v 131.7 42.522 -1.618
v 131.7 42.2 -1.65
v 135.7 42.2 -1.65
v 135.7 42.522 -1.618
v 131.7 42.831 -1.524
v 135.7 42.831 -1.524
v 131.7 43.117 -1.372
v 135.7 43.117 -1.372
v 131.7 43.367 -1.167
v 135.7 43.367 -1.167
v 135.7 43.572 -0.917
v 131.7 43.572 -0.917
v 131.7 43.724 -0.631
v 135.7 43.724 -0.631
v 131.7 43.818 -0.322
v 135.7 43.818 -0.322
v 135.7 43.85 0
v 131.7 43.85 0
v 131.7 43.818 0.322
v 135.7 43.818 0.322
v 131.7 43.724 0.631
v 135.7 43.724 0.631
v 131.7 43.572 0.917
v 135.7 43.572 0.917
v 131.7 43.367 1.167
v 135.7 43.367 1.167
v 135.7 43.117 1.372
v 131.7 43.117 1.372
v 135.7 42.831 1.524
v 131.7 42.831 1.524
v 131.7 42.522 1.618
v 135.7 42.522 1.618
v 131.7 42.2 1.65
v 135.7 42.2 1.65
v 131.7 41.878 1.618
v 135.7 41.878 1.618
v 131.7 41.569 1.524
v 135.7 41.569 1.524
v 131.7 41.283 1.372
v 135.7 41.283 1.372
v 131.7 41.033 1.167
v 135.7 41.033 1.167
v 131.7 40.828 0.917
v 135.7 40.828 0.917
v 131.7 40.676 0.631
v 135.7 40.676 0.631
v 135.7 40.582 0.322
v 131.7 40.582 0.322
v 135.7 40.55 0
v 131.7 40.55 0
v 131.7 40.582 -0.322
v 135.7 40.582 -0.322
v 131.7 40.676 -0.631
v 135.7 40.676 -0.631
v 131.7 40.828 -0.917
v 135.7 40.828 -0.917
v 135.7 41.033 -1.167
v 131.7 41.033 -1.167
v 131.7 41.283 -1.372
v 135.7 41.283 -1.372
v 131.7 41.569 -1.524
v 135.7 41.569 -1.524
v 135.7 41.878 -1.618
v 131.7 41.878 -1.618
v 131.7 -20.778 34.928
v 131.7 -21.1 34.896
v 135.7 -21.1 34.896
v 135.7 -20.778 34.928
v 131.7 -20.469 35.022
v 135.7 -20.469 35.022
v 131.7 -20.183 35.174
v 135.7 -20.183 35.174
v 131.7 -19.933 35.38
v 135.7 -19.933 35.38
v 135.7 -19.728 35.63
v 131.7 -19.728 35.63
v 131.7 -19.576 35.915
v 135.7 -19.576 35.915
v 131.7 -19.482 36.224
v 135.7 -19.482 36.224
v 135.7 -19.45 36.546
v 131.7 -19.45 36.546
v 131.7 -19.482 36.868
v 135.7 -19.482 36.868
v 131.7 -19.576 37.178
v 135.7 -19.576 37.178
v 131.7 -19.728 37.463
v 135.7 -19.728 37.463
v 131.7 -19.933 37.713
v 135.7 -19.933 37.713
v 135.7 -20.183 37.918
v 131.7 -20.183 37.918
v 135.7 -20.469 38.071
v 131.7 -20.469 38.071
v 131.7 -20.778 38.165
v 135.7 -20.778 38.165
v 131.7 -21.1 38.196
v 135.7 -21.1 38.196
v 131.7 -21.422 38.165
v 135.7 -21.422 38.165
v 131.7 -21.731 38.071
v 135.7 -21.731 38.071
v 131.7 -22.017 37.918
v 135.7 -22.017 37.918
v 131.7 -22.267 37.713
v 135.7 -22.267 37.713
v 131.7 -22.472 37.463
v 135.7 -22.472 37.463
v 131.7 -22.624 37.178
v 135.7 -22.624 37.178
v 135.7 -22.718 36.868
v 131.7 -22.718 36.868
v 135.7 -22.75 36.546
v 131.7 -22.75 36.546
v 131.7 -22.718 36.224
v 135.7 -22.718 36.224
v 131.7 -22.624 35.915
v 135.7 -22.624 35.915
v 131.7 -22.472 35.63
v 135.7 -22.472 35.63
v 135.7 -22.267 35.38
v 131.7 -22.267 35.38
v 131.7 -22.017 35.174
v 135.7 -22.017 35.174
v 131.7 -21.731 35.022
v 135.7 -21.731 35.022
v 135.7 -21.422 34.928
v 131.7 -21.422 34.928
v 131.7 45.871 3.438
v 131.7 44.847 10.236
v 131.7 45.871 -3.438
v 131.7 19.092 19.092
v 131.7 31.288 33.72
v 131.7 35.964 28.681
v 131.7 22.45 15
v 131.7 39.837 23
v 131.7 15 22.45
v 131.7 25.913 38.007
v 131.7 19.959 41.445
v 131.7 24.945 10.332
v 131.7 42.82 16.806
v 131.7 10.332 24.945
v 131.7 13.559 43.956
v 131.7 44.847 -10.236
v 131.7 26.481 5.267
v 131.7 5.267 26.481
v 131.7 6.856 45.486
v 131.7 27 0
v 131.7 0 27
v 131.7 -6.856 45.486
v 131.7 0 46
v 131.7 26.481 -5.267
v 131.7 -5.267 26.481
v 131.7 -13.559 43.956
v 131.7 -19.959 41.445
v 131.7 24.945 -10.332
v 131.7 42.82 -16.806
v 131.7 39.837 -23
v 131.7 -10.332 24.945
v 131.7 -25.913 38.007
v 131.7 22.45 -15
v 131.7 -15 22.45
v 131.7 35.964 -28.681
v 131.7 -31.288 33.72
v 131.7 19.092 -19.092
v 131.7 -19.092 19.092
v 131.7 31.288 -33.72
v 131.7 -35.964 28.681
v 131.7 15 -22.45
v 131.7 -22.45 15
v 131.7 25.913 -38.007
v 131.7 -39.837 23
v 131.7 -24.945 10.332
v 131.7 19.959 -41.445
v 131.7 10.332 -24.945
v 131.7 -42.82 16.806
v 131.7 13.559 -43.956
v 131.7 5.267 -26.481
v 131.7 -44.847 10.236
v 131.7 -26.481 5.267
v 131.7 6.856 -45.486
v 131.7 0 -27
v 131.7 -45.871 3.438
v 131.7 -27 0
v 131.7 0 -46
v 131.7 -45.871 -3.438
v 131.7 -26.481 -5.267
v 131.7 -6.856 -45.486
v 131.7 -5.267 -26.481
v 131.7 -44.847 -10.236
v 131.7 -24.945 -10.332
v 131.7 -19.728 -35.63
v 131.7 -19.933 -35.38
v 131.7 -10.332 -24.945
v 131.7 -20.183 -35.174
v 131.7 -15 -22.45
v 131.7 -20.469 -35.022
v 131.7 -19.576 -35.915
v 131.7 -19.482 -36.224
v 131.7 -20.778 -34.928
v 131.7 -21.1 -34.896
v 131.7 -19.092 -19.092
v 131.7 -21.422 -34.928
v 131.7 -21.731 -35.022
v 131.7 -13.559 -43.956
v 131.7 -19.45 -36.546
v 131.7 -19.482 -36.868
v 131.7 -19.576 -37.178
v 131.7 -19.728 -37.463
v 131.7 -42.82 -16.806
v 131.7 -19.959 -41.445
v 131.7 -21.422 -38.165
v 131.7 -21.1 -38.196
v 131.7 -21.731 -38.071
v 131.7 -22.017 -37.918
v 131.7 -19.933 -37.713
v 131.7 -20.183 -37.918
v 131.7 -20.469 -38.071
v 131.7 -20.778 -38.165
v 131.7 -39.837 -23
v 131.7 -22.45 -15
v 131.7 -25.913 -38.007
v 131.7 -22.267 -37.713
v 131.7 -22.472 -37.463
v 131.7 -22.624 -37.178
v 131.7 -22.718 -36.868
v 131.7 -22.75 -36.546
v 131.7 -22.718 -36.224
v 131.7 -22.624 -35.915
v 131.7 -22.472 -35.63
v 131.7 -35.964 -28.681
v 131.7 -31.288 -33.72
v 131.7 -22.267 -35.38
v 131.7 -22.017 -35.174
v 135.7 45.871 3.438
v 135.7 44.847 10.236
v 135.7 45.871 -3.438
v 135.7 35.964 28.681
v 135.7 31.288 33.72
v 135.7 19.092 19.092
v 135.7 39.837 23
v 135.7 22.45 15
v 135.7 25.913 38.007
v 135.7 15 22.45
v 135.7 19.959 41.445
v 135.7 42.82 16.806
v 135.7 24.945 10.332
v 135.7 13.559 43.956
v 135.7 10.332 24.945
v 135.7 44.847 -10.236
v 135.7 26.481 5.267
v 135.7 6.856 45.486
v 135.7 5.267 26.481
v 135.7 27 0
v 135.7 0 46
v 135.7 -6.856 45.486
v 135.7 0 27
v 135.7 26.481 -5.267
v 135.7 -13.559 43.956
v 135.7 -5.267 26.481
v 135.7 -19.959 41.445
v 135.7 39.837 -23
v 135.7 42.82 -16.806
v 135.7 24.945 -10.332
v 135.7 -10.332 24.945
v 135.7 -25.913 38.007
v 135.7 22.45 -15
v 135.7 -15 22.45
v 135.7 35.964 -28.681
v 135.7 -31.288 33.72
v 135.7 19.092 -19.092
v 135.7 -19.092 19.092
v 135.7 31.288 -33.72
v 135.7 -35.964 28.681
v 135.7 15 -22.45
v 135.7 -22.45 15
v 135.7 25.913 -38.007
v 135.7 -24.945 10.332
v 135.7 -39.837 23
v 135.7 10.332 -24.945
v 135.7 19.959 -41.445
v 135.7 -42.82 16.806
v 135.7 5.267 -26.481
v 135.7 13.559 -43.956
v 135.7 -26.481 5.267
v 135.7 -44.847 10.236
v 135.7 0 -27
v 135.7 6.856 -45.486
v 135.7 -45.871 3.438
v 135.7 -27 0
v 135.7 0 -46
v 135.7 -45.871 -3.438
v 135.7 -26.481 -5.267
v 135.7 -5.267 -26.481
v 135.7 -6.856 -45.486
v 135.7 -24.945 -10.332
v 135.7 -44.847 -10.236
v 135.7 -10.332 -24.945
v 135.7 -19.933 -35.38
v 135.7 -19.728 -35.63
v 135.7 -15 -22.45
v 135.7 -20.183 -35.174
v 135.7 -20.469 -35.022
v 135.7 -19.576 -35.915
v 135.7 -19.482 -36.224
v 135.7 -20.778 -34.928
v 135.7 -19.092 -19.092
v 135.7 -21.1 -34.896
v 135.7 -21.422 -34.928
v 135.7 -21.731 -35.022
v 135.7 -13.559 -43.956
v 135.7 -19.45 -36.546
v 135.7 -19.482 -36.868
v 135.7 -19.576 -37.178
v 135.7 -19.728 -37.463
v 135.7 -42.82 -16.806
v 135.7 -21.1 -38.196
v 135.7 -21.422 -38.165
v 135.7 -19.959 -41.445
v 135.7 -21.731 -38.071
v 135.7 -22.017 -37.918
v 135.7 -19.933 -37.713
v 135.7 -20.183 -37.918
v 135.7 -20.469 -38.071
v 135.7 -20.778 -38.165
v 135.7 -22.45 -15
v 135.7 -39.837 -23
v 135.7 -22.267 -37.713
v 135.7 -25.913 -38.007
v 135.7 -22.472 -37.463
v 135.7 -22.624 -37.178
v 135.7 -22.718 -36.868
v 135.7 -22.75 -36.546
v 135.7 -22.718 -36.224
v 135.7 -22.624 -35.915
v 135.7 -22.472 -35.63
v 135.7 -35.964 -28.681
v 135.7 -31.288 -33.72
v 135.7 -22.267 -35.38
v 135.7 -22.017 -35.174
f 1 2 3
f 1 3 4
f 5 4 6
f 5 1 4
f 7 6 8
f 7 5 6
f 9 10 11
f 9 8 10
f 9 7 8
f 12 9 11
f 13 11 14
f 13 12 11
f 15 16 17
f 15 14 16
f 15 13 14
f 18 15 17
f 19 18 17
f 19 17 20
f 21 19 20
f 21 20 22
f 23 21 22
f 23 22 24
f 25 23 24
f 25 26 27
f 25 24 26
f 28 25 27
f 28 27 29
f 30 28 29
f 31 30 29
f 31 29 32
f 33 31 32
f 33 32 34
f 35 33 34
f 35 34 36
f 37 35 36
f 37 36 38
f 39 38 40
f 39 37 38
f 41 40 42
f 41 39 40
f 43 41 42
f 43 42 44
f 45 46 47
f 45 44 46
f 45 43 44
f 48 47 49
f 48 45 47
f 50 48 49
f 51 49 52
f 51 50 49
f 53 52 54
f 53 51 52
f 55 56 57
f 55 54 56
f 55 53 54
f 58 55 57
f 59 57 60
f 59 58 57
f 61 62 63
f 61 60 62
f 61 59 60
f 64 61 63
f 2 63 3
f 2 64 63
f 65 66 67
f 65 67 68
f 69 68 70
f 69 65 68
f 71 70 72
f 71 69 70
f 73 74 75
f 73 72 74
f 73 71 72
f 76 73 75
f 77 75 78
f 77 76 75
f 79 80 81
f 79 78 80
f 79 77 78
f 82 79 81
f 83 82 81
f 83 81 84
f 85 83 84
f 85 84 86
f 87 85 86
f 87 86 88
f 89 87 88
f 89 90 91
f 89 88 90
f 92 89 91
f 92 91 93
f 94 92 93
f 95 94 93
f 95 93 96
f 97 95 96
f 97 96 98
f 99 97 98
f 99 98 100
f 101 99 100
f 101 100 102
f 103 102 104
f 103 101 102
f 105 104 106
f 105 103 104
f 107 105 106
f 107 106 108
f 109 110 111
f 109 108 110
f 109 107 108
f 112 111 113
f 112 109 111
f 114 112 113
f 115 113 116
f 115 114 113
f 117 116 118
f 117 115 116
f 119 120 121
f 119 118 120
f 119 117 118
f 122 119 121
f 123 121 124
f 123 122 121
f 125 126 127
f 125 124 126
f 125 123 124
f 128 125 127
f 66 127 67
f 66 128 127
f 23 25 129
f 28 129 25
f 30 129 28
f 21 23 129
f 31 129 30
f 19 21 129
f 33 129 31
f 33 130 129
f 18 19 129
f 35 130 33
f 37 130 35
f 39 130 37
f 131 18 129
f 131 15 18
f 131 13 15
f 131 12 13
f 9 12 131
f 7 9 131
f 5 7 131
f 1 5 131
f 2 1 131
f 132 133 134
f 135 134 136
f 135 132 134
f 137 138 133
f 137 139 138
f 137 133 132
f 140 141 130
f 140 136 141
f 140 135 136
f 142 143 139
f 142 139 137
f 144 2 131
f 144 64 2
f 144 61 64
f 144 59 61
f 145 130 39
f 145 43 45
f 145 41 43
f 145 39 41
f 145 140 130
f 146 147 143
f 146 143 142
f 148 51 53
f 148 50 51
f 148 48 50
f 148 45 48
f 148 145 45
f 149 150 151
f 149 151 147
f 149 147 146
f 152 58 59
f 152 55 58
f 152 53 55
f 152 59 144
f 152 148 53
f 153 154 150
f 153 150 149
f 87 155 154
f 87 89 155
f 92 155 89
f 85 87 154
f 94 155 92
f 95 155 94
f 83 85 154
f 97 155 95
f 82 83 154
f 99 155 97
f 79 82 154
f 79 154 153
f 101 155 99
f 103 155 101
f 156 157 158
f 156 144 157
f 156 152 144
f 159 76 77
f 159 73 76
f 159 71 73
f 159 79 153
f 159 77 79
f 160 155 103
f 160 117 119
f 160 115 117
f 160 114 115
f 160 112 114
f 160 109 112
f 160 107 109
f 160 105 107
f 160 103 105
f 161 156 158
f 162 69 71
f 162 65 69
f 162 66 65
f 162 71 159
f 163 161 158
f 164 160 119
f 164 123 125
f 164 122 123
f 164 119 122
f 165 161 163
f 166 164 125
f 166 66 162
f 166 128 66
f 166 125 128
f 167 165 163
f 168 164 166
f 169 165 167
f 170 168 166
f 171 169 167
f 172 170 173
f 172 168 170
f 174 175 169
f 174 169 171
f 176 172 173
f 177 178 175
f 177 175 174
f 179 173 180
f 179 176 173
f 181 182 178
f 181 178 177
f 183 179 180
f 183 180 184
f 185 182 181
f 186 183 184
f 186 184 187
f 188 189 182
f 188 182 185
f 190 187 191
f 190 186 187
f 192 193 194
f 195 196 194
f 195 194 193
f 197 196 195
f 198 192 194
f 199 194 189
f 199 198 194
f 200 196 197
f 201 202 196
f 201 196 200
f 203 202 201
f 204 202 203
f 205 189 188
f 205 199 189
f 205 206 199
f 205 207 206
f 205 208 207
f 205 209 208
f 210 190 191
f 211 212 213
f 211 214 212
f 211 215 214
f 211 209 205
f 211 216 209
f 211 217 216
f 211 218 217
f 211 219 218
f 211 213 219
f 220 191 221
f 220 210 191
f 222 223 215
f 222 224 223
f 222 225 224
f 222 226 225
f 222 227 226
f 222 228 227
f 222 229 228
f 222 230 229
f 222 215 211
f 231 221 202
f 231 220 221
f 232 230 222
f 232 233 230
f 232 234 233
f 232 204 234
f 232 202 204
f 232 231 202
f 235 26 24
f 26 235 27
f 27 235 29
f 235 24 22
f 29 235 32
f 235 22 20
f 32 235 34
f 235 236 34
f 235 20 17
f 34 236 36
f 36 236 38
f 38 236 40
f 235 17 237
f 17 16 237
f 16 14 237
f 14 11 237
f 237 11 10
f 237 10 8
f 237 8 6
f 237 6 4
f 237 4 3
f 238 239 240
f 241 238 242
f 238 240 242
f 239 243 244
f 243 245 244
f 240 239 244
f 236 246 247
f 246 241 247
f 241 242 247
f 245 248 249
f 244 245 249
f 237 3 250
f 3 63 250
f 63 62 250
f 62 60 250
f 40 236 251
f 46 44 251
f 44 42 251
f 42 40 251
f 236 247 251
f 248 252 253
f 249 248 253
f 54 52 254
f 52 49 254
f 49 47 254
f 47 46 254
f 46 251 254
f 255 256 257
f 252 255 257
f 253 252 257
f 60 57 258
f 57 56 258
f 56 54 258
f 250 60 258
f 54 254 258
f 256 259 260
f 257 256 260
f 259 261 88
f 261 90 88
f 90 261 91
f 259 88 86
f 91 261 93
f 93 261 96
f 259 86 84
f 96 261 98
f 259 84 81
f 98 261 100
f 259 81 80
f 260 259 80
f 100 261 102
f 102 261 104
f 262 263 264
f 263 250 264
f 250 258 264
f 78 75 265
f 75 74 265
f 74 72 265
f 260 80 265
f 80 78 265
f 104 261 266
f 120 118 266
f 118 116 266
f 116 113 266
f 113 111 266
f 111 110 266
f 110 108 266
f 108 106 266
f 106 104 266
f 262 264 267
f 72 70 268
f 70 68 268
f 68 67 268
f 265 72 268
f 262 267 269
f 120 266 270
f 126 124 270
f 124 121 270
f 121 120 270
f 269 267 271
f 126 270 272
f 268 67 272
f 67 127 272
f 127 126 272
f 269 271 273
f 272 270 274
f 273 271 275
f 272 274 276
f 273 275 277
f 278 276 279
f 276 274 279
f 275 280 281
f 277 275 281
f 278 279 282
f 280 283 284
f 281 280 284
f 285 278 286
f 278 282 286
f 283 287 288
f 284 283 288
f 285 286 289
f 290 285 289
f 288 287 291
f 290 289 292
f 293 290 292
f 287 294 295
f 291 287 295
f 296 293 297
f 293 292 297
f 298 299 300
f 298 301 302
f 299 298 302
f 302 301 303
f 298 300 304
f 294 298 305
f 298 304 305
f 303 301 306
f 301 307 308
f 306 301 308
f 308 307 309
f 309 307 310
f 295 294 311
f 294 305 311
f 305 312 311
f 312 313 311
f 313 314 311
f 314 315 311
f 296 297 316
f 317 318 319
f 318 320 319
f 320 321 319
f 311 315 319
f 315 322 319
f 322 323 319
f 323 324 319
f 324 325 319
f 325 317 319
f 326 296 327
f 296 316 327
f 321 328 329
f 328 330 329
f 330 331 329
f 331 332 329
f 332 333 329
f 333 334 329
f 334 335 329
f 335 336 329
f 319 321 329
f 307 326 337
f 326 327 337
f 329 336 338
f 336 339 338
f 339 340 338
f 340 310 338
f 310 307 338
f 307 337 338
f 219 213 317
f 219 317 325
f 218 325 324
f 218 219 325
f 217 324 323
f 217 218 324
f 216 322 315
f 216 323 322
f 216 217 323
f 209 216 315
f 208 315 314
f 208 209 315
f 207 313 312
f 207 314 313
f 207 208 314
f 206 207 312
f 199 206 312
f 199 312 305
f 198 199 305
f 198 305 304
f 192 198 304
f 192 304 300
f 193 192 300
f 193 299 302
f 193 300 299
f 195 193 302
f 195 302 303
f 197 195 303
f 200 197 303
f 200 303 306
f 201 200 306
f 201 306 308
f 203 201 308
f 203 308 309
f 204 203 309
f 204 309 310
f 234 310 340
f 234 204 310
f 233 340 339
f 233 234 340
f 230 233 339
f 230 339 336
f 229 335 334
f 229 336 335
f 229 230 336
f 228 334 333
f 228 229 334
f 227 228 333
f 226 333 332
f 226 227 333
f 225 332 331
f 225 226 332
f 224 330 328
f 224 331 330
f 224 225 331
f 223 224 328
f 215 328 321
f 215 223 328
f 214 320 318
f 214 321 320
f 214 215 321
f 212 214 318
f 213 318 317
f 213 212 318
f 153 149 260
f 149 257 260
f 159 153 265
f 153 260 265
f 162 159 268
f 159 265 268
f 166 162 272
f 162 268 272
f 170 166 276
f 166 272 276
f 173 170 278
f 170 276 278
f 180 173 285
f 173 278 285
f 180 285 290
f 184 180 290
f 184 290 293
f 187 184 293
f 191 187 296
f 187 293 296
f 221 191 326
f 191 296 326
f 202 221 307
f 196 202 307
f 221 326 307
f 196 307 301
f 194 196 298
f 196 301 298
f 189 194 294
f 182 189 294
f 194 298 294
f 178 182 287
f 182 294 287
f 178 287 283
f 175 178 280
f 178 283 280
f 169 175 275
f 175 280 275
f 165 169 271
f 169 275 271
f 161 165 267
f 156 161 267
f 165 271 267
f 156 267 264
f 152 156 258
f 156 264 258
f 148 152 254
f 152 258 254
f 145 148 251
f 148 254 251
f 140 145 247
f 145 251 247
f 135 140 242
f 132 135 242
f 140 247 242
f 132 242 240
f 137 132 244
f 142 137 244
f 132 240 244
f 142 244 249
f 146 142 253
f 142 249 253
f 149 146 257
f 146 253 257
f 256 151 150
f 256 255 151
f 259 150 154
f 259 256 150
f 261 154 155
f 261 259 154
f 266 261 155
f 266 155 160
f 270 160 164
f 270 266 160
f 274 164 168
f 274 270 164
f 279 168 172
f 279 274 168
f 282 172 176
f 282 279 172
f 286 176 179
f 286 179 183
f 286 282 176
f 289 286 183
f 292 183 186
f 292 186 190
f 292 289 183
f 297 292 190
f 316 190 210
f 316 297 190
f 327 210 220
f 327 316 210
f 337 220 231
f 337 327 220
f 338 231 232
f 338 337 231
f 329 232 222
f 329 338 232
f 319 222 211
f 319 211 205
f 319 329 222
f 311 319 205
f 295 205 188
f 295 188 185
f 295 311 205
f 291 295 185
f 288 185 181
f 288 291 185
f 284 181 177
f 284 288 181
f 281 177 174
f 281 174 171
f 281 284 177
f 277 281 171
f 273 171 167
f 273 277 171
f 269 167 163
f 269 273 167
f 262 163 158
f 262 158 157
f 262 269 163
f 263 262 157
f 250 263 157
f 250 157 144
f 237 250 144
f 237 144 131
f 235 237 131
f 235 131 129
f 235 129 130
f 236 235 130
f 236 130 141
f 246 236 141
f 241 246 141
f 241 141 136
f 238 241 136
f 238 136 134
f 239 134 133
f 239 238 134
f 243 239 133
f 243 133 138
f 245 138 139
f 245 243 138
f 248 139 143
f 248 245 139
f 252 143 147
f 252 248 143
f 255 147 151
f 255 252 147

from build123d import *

# Parameters (mm, degrees)
AXIAL_PROFILE_MM_W     = 4
AXIAL_PROFILE_MM_H     = 19
AXIAL_HOLES_DEPTH      = 151.487507787
AXIAL_HOLES_DEPTH_BACK = 151.487507787
SKETCH2_R              = 1.65


with BuildPart() as part:
    # Axial profile (mm) → Full revolution (revolve)
    with BuildSketch(Plane.XY, mode=Mode.PRIVATE) as full_revolution_sk:
        with Locations((133.7, 36.5)):
            Rectangle(AXIAL_PROFILE_MM_W, AXIAL_PROFILE_MM_H)
    revolve(full_revolution_sk.sketch.rotate(Axis((-110, 0, 0), (1, 0, 0)), 90), axis=Axis((-110, 0, 0), (1, 0, 0)))

    # Sketch2 → Axial holes (cut, two sides: drawn at the far end of the back side and taken through both)
    with BuildSketch(Plane(origin=(0, 0, 0), x_dir=(0, 0, -1), z_dir=(1, 0, 0)).offset(-AXIAL_HOLES_DEPTH_BACK)):
        with Locations((0, 42.2)):
            Circle(SKETCH2_R)
        with Locations((-36.54627204, -21.1)):
            Circle(SKETCH2_R)
        with Locations((36.54627204, -21.1)):
            Circle(SKETCH2_R)
    extrude(amount=AXIAL_HOLES_DEPTH + AXIAL_HOLES_DEPTH_BACK, mode=Mode.SUBTRACT)


solid = part.part
